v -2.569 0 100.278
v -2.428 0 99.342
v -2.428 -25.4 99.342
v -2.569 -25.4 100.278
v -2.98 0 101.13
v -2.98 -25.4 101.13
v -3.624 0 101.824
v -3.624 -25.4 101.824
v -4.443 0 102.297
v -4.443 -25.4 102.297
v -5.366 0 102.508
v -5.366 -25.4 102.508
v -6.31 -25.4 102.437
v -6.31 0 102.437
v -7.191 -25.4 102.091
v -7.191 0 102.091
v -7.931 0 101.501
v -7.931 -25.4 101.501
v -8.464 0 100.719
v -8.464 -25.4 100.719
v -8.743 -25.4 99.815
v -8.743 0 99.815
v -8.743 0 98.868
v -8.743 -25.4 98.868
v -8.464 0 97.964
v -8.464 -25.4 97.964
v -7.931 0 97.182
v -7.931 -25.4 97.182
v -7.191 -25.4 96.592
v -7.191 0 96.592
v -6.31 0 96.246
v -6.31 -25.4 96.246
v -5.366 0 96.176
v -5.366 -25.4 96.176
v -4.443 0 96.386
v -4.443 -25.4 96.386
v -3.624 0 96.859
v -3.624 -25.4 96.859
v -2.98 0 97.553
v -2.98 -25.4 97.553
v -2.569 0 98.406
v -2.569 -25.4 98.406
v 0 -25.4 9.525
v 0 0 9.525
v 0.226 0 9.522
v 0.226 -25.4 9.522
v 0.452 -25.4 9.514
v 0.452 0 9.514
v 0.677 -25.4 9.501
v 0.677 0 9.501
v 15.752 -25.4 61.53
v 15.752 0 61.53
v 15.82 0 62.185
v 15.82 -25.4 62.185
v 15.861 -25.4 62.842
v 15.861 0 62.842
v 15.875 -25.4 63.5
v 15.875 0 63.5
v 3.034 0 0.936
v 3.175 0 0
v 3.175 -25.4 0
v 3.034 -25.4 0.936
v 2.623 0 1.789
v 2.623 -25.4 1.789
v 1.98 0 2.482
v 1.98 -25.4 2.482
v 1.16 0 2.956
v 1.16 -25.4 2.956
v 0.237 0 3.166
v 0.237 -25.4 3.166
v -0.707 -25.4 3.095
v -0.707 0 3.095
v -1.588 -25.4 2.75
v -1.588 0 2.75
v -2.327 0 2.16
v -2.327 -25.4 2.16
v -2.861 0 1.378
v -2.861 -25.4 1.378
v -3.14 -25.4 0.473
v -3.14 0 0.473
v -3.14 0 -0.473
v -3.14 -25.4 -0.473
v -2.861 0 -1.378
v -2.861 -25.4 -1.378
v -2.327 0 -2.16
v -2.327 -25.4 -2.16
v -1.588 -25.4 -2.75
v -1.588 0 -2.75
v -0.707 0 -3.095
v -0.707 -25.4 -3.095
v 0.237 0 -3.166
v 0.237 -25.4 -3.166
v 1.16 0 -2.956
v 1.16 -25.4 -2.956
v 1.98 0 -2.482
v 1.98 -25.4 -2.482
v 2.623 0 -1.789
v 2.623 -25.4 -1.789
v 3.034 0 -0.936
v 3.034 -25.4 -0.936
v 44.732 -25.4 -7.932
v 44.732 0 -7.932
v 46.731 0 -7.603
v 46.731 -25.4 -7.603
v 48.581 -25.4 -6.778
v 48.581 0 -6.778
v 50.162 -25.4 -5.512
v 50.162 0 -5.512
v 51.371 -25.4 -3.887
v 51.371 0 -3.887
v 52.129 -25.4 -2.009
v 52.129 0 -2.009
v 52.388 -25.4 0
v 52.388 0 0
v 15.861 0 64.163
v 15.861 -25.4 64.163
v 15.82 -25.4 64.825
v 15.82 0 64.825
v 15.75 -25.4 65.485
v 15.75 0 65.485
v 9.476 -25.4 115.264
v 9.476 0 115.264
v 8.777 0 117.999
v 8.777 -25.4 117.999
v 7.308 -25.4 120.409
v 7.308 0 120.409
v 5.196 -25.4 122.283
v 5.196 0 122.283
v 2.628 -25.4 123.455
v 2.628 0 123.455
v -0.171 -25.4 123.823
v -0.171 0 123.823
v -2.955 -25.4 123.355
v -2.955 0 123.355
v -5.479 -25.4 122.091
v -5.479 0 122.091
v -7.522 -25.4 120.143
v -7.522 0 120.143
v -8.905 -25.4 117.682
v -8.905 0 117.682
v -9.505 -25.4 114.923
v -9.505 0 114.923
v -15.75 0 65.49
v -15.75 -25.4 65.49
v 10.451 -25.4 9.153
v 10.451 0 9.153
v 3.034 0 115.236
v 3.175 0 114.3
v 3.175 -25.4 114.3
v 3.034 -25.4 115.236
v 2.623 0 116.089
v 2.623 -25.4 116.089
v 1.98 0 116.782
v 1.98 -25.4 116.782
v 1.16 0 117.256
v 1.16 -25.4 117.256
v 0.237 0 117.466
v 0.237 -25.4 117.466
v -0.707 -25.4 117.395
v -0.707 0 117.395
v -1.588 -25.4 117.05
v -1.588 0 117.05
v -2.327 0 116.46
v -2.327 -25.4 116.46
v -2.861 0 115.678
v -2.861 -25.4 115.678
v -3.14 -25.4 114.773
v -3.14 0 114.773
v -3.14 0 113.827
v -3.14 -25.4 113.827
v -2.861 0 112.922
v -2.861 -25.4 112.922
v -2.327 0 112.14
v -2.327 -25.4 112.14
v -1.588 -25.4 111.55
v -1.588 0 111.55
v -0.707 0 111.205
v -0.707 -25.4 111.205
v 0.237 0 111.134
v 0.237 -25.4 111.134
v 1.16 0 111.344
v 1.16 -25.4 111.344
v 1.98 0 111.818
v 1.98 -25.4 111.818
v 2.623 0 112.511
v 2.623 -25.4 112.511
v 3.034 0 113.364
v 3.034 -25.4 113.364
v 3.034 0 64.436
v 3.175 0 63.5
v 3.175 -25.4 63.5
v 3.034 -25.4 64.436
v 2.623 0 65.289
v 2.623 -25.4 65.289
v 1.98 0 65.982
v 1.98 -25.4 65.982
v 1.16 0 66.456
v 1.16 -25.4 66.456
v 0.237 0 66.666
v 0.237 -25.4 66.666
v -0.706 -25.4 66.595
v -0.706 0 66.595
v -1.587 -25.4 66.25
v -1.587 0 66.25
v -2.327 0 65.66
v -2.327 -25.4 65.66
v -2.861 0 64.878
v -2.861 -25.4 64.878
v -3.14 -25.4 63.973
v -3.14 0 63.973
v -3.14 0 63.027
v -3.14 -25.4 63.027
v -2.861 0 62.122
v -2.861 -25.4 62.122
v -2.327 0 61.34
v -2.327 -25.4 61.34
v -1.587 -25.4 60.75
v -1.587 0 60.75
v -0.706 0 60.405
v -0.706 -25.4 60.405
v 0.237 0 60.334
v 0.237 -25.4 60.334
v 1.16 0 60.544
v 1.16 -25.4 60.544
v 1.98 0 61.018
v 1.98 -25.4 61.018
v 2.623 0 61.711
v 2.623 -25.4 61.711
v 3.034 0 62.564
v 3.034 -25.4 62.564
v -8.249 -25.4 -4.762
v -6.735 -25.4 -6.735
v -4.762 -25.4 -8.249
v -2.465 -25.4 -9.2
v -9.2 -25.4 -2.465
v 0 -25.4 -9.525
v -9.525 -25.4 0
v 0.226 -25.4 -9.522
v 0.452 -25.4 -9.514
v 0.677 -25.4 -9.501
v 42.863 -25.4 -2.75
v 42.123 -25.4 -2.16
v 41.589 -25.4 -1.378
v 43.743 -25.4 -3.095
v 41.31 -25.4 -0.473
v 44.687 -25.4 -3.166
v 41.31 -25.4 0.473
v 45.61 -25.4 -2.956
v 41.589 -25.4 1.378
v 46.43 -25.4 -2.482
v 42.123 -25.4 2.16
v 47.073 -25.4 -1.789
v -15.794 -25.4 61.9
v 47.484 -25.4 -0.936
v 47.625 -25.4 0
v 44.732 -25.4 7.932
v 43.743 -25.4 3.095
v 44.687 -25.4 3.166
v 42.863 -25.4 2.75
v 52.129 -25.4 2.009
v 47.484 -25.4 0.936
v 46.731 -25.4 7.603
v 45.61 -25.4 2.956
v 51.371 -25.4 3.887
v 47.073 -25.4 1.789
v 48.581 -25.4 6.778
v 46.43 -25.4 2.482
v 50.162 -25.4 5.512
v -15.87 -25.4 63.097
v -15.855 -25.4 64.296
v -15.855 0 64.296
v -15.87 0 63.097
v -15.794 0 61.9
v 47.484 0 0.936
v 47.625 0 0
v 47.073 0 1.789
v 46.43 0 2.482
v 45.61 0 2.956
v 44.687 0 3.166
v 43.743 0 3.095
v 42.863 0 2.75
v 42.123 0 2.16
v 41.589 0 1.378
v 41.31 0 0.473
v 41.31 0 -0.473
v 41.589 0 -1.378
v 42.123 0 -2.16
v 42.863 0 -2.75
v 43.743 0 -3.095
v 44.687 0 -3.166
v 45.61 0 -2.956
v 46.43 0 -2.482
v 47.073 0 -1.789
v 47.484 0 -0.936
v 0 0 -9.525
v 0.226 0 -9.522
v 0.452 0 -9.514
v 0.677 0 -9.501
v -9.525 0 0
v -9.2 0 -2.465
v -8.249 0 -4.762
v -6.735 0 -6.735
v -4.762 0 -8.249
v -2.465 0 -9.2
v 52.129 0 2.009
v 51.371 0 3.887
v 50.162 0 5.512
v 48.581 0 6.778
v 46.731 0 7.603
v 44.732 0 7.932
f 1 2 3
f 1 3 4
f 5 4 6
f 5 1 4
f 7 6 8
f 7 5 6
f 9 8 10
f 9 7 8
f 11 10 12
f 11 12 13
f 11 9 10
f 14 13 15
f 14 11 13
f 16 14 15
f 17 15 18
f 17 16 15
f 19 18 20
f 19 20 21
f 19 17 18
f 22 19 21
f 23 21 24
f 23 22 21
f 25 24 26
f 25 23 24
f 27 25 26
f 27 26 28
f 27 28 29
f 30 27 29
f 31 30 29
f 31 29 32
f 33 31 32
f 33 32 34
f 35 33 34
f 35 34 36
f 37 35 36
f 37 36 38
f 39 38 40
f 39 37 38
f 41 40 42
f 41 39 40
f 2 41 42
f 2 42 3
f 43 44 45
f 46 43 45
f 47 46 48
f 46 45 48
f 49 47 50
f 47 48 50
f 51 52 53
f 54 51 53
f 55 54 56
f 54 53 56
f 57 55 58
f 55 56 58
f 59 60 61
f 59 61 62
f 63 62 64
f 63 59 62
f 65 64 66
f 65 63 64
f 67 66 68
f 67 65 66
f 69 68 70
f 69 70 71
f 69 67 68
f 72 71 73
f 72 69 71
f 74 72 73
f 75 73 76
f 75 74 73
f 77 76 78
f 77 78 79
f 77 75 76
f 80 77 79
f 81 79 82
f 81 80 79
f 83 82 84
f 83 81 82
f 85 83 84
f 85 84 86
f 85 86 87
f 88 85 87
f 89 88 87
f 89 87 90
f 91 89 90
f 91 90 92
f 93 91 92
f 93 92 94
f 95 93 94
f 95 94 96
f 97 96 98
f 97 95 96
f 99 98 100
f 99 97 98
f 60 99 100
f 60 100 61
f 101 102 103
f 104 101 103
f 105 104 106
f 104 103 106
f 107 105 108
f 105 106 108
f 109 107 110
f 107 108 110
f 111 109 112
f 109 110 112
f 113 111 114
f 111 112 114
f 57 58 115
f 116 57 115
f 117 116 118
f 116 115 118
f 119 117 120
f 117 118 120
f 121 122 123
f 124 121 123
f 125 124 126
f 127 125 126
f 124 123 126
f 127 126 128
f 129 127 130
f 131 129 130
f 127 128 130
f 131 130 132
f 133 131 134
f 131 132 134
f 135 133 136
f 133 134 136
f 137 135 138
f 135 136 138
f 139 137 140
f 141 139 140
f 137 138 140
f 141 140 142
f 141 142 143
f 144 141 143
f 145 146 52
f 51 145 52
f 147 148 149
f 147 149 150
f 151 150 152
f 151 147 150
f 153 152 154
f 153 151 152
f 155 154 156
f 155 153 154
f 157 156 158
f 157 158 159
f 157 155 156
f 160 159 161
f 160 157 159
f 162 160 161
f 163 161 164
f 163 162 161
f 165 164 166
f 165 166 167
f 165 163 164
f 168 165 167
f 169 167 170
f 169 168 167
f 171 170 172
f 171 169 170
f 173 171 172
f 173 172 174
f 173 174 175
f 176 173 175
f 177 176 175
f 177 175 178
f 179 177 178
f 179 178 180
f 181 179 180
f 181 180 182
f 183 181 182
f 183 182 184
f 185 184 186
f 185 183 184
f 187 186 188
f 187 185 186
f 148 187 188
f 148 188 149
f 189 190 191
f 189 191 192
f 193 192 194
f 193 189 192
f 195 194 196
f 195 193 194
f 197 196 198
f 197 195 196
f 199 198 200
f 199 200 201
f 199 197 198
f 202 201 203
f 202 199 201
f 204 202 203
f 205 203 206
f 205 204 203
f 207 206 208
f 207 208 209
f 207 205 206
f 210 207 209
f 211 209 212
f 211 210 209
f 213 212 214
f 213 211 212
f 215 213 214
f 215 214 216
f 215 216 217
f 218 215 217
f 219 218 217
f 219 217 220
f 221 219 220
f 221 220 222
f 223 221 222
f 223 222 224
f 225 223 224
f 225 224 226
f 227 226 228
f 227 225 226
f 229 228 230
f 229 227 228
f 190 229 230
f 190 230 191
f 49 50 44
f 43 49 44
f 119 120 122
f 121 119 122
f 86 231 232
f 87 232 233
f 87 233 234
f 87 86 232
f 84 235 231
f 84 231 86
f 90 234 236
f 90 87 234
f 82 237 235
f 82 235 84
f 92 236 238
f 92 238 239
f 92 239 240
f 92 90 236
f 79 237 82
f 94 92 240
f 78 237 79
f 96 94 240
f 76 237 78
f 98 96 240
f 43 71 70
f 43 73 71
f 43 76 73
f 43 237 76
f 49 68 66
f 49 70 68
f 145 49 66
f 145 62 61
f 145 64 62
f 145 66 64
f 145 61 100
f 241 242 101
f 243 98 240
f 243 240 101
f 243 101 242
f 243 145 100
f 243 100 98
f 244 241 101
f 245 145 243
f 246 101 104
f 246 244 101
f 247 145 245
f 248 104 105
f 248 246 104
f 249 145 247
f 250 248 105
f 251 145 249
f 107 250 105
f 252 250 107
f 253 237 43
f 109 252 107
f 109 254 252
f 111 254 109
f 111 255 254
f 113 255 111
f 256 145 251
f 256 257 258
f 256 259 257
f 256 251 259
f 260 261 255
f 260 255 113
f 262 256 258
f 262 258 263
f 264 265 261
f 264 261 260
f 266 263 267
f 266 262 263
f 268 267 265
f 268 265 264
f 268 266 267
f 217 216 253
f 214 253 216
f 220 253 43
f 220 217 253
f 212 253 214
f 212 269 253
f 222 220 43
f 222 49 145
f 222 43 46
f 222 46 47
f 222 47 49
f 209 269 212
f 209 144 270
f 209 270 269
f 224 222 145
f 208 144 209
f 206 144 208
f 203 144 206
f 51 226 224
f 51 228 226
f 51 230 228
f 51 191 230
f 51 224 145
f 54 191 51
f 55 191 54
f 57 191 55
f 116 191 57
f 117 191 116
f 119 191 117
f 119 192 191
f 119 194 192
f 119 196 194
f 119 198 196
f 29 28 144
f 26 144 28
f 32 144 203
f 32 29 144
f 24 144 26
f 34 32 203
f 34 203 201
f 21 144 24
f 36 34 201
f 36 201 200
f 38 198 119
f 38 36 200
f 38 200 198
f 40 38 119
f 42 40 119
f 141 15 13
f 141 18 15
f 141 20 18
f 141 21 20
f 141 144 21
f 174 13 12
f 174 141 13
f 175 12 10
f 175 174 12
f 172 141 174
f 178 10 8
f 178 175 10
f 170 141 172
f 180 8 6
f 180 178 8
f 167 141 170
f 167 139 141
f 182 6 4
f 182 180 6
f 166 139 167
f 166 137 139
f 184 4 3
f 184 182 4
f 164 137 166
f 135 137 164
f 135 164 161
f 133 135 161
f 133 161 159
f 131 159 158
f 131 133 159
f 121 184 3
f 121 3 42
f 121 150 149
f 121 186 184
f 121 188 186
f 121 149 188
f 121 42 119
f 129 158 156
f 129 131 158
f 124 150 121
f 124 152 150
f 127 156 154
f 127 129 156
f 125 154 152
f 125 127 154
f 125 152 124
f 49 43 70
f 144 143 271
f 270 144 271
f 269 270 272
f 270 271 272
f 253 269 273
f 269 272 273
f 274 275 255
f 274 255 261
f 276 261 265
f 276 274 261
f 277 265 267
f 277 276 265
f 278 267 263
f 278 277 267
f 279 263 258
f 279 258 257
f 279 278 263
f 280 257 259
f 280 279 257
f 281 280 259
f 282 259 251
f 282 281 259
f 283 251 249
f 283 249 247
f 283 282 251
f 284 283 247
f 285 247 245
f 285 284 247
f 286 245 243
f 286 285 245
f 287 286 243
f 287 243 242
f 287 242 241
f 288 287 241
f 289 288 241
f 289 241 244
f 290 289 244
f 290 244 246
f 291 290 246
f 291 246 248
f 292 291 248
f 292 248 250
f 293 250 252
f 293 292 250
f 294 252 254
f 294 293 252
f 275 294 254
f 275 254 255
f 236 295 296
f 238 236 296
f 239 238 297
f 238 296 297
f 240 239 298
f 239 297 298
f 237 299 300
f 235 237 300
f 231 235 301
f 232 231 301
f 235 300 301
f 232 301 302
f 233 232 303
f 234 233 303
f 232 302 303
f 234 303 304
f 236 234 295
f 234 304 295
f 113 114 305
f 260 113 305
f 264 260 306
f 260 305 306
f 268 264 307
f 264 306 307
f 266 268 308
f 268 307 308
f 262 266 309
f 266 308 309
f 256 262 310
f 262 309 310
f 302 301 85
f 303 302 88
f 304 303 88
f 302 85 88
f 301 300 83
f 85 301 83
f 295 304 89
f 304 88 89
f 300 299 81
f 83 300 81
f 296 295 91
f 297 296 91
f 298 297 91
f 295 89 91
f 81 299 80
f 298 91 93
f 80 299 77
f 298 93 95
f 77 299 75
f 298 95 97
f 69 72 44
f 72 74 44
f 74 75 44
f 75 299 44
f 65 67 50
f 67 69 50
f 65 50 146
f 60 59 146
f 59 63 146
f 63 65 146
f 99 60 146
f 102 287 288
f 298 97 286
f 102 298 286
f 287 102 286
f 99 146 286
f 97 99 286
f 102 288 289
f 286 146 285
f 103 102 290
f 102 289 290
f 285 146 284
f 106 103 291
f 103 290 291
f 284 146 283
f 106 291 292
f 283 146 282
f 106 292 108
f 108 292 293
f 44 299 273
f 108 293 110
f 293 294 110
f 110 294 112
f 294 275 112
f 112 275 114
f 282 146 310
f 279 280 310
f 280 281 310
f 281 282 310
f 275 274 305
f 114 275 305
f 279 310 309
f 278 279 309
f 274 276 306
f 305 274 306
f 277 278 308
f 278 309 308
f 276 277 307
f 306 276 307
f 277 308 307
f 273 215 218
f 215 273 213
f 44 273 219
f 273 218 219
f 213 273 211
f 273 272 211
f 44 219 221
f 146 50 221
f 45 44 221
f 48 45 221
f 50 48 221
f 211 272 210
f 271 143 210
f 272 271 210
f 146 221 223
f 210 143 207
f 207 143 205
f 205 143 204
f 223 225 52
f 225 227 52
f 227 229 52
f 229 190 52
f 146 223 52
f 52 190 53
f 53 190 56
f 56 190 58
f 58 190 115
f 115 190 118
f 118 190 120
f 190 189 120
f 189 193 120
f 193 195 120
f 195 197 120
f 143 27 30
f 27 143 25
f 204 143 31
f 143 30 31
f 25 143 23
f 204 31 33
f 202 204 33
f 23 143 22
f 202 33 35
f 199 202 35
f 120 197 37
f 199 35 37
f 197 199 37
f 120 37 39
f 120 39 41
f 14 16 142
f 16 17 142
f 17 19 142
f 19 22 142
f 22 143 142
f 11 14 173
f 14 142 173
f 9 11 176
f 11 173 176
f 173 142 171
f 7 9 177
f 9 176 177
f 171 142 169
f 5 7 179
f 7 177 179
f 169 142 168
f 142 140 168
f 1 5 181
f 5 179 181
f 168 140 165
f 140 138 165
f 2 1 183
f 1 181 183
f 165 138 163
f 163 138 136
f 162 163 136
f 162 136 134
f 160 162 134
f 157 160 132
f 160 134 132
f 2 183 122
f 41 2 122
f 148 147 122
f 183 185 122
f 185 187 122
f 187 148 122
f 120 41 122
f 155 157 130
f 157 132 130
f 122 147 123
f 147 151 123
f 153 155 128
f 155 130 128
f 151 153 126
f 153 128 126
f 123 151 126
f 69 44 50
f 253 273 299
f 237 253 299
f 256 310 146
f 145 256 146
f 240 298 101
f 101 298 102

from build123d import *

# Parameters (mm, degrees)
F0_R     = 3.175
F1_DEPTH = 25.4


with BuildPart() as f1:
    # F0 (on Front) → F1 (new body)
    with BuildSketch(Plane.XZ):
        with BuildLine():
            Line((0.6773435479, 9.500885786), (0, 9.525))
            ThreePointArc((0, 9.525), (-6.7351920908, 6.7351920908), (-9.525, 0))
            ThreePointArc((-9.525, 0), (-6.7351920908, -6.7351920908), (0, -9.525))
            Line((0, -9.525), (0.6773435479, -9.500885786))
            ThreePointArc((0.6773435479, -9.500885786), (6.9705567315, -6.4912990883), (9.525, 0))
            ThreePointArc((9.525, 0), (6.9705567315, 6.4912990883), (0.6773435479, 9.500885786))
        make_face()
        Circle(F0_R, mode=Mode.SUBTRACT)
        with BuildLine():
            ThreePointArc((-9.525, 0), (-6.7351920908, 6.7351920908), (0, 9.525))
            ThreePointArc((0, 9.525), (0.3388863295, 9.5189695375), (0.6773435479, 9.500885786))
            Line((0.6773435479, 9.500885786), (10.4513434813, 9.1529200793))
            Line((10.4513434813, 9.1529200793), (15.7522627132, 61.5297015358))
            ThreePointArc((15.7522627132, 61.5297015358), (-0.1865159815, 47.6260958159), (-15.7941956396, 61.9003822774))
            Line((-15.7941956396, 61.9003822774), (-9.525, 0))
        make_face()
        with BuildLine():
            Line((10.4513434813, 9.1529200793), (0.6773435479, 9.500885786))
            ThreePointArc((0.6773435479, 9.500885786), (6.9705567315, 6.4912990883), (9.525, 0))
            Line((9.525, 0), (10.4513434813, 9.1529200793))
        make_face()
        with BuildLine():
            Line((0.6773435479, -9.500885786), (0, -9.525))
            ThreePointArc((0, -9.525), (0.3388863295, -9.5189695375), (0.6773435479, -9.500885786))
        make_face()
        with BuildLine():
            ThreePointArc((-15.7498007105, 65.4897665669), (-15.8737785304, 63.696333282), (-15.7941956396, 61.9003822774))
            ThreePointArc((-15.7941956396, 61.9003822774), (-0.1865159815, 47.6260958159), (15.7522627132, 61.5297015358))
            ThreePointArc((15.7522627132, 61.5297015358), (15.8442914769, 62.5129409485), (15.8750073521, 63.5))
            ThreePointArc((15.8750073521, 63.5), (15.8438216155, 64.494572565), (15.7503869317, 65.4852375421))
            ThreePointArc((15.7503869317, 65.4852375421), (0.0022898231, 79.3749998359), (-15.7498007105, 65.4897665669))
        make_face()
        with Locations((7.3521e-06, 63.5)):
            Circle(F0_R, mode=Mode.SUBTRACT)
        with BuildLine():
            Line((10.4513434813, 9.1529200793), (9.525, 0))
            ThreePointArc((9.525, 0), (6.9705567315, -6.4912990883), (0.6773435479, -9.500885786))
            Line((0.6773435479, -9.500885786), (44.7324052746, -7.9324746146))
            ThreePointArc((44.7324052746, -7.9324746146), (36.5125, 0), (44.7324052746, 7.9324746146))
            Line((44.7324052746, 7.9324746146), (10.4513434813, 9.1529200793))
        make_face()
        with BuildLine():
            Line((-9.5046001494, 114.9230577828), (-15.7498007105, 65.4897665669))
            ThreePointArc((-15.7498007105, 65.4897665669), (0.0022898231, 79.3749998359), (15.7503869317, 65.4852375421))
            Line((15.7503869317, 65.4852375421), (9.4761320574, 115.2636110372))
            ThreePointArc((9.4761320574, 115.2636110372), (9.5127751694, 114.782424685), (9.525, 114.3))
            ThreePointArc((9.525, 114.3), (-0.3116958272, 104.7801013287), (-9.5046001494, 114.9230577828))
        make_face()
        with Locations((-5.6031434797, 99.3416681886)):
            Circle(F0_R, mode=Mode.SUBTRACT)
        with BuildLine():
            ThreePointArc((52.3875, 0), (50.1616327839, 5.5119104847), (44.7324052746, 7.9324746146))
            ThreePointArc((44.7324052746, 7.9324746146), (36.5125, 0), (44.7324052746, -7.9324746146))
            ThreePointArc((44.7324052746, -7.9324746146), (50.1616327839, -5.5119104847), (52.3875, 0))
        make_face()
        with Locations((44.45, 0)):
            Circle(F0_R, mode=Mode.SUBTRACT)
        with BuildLine():
            ThreePointArc((9.4761320574, 115.2636110372), (-0.1708705294, 123.8234672395), (-9.5046001494, 114.9230577828))
            ThreePointArc((-9.5046001494, 114.9230577828), (-0.3116958272, 104.7801013287), (9.525, 114.3))
            ThreePointArc((9.525, 114.3), (9.5127751694, 114.782424685), (9.4761320574, 115.2636110372))
        make_face()
        with Locations((0, 114.3)):
            Circle(F0_R, mode=Mode.SUBTRACT)
    extrude(amount=F1_DEPTH)


solid = f1.part
